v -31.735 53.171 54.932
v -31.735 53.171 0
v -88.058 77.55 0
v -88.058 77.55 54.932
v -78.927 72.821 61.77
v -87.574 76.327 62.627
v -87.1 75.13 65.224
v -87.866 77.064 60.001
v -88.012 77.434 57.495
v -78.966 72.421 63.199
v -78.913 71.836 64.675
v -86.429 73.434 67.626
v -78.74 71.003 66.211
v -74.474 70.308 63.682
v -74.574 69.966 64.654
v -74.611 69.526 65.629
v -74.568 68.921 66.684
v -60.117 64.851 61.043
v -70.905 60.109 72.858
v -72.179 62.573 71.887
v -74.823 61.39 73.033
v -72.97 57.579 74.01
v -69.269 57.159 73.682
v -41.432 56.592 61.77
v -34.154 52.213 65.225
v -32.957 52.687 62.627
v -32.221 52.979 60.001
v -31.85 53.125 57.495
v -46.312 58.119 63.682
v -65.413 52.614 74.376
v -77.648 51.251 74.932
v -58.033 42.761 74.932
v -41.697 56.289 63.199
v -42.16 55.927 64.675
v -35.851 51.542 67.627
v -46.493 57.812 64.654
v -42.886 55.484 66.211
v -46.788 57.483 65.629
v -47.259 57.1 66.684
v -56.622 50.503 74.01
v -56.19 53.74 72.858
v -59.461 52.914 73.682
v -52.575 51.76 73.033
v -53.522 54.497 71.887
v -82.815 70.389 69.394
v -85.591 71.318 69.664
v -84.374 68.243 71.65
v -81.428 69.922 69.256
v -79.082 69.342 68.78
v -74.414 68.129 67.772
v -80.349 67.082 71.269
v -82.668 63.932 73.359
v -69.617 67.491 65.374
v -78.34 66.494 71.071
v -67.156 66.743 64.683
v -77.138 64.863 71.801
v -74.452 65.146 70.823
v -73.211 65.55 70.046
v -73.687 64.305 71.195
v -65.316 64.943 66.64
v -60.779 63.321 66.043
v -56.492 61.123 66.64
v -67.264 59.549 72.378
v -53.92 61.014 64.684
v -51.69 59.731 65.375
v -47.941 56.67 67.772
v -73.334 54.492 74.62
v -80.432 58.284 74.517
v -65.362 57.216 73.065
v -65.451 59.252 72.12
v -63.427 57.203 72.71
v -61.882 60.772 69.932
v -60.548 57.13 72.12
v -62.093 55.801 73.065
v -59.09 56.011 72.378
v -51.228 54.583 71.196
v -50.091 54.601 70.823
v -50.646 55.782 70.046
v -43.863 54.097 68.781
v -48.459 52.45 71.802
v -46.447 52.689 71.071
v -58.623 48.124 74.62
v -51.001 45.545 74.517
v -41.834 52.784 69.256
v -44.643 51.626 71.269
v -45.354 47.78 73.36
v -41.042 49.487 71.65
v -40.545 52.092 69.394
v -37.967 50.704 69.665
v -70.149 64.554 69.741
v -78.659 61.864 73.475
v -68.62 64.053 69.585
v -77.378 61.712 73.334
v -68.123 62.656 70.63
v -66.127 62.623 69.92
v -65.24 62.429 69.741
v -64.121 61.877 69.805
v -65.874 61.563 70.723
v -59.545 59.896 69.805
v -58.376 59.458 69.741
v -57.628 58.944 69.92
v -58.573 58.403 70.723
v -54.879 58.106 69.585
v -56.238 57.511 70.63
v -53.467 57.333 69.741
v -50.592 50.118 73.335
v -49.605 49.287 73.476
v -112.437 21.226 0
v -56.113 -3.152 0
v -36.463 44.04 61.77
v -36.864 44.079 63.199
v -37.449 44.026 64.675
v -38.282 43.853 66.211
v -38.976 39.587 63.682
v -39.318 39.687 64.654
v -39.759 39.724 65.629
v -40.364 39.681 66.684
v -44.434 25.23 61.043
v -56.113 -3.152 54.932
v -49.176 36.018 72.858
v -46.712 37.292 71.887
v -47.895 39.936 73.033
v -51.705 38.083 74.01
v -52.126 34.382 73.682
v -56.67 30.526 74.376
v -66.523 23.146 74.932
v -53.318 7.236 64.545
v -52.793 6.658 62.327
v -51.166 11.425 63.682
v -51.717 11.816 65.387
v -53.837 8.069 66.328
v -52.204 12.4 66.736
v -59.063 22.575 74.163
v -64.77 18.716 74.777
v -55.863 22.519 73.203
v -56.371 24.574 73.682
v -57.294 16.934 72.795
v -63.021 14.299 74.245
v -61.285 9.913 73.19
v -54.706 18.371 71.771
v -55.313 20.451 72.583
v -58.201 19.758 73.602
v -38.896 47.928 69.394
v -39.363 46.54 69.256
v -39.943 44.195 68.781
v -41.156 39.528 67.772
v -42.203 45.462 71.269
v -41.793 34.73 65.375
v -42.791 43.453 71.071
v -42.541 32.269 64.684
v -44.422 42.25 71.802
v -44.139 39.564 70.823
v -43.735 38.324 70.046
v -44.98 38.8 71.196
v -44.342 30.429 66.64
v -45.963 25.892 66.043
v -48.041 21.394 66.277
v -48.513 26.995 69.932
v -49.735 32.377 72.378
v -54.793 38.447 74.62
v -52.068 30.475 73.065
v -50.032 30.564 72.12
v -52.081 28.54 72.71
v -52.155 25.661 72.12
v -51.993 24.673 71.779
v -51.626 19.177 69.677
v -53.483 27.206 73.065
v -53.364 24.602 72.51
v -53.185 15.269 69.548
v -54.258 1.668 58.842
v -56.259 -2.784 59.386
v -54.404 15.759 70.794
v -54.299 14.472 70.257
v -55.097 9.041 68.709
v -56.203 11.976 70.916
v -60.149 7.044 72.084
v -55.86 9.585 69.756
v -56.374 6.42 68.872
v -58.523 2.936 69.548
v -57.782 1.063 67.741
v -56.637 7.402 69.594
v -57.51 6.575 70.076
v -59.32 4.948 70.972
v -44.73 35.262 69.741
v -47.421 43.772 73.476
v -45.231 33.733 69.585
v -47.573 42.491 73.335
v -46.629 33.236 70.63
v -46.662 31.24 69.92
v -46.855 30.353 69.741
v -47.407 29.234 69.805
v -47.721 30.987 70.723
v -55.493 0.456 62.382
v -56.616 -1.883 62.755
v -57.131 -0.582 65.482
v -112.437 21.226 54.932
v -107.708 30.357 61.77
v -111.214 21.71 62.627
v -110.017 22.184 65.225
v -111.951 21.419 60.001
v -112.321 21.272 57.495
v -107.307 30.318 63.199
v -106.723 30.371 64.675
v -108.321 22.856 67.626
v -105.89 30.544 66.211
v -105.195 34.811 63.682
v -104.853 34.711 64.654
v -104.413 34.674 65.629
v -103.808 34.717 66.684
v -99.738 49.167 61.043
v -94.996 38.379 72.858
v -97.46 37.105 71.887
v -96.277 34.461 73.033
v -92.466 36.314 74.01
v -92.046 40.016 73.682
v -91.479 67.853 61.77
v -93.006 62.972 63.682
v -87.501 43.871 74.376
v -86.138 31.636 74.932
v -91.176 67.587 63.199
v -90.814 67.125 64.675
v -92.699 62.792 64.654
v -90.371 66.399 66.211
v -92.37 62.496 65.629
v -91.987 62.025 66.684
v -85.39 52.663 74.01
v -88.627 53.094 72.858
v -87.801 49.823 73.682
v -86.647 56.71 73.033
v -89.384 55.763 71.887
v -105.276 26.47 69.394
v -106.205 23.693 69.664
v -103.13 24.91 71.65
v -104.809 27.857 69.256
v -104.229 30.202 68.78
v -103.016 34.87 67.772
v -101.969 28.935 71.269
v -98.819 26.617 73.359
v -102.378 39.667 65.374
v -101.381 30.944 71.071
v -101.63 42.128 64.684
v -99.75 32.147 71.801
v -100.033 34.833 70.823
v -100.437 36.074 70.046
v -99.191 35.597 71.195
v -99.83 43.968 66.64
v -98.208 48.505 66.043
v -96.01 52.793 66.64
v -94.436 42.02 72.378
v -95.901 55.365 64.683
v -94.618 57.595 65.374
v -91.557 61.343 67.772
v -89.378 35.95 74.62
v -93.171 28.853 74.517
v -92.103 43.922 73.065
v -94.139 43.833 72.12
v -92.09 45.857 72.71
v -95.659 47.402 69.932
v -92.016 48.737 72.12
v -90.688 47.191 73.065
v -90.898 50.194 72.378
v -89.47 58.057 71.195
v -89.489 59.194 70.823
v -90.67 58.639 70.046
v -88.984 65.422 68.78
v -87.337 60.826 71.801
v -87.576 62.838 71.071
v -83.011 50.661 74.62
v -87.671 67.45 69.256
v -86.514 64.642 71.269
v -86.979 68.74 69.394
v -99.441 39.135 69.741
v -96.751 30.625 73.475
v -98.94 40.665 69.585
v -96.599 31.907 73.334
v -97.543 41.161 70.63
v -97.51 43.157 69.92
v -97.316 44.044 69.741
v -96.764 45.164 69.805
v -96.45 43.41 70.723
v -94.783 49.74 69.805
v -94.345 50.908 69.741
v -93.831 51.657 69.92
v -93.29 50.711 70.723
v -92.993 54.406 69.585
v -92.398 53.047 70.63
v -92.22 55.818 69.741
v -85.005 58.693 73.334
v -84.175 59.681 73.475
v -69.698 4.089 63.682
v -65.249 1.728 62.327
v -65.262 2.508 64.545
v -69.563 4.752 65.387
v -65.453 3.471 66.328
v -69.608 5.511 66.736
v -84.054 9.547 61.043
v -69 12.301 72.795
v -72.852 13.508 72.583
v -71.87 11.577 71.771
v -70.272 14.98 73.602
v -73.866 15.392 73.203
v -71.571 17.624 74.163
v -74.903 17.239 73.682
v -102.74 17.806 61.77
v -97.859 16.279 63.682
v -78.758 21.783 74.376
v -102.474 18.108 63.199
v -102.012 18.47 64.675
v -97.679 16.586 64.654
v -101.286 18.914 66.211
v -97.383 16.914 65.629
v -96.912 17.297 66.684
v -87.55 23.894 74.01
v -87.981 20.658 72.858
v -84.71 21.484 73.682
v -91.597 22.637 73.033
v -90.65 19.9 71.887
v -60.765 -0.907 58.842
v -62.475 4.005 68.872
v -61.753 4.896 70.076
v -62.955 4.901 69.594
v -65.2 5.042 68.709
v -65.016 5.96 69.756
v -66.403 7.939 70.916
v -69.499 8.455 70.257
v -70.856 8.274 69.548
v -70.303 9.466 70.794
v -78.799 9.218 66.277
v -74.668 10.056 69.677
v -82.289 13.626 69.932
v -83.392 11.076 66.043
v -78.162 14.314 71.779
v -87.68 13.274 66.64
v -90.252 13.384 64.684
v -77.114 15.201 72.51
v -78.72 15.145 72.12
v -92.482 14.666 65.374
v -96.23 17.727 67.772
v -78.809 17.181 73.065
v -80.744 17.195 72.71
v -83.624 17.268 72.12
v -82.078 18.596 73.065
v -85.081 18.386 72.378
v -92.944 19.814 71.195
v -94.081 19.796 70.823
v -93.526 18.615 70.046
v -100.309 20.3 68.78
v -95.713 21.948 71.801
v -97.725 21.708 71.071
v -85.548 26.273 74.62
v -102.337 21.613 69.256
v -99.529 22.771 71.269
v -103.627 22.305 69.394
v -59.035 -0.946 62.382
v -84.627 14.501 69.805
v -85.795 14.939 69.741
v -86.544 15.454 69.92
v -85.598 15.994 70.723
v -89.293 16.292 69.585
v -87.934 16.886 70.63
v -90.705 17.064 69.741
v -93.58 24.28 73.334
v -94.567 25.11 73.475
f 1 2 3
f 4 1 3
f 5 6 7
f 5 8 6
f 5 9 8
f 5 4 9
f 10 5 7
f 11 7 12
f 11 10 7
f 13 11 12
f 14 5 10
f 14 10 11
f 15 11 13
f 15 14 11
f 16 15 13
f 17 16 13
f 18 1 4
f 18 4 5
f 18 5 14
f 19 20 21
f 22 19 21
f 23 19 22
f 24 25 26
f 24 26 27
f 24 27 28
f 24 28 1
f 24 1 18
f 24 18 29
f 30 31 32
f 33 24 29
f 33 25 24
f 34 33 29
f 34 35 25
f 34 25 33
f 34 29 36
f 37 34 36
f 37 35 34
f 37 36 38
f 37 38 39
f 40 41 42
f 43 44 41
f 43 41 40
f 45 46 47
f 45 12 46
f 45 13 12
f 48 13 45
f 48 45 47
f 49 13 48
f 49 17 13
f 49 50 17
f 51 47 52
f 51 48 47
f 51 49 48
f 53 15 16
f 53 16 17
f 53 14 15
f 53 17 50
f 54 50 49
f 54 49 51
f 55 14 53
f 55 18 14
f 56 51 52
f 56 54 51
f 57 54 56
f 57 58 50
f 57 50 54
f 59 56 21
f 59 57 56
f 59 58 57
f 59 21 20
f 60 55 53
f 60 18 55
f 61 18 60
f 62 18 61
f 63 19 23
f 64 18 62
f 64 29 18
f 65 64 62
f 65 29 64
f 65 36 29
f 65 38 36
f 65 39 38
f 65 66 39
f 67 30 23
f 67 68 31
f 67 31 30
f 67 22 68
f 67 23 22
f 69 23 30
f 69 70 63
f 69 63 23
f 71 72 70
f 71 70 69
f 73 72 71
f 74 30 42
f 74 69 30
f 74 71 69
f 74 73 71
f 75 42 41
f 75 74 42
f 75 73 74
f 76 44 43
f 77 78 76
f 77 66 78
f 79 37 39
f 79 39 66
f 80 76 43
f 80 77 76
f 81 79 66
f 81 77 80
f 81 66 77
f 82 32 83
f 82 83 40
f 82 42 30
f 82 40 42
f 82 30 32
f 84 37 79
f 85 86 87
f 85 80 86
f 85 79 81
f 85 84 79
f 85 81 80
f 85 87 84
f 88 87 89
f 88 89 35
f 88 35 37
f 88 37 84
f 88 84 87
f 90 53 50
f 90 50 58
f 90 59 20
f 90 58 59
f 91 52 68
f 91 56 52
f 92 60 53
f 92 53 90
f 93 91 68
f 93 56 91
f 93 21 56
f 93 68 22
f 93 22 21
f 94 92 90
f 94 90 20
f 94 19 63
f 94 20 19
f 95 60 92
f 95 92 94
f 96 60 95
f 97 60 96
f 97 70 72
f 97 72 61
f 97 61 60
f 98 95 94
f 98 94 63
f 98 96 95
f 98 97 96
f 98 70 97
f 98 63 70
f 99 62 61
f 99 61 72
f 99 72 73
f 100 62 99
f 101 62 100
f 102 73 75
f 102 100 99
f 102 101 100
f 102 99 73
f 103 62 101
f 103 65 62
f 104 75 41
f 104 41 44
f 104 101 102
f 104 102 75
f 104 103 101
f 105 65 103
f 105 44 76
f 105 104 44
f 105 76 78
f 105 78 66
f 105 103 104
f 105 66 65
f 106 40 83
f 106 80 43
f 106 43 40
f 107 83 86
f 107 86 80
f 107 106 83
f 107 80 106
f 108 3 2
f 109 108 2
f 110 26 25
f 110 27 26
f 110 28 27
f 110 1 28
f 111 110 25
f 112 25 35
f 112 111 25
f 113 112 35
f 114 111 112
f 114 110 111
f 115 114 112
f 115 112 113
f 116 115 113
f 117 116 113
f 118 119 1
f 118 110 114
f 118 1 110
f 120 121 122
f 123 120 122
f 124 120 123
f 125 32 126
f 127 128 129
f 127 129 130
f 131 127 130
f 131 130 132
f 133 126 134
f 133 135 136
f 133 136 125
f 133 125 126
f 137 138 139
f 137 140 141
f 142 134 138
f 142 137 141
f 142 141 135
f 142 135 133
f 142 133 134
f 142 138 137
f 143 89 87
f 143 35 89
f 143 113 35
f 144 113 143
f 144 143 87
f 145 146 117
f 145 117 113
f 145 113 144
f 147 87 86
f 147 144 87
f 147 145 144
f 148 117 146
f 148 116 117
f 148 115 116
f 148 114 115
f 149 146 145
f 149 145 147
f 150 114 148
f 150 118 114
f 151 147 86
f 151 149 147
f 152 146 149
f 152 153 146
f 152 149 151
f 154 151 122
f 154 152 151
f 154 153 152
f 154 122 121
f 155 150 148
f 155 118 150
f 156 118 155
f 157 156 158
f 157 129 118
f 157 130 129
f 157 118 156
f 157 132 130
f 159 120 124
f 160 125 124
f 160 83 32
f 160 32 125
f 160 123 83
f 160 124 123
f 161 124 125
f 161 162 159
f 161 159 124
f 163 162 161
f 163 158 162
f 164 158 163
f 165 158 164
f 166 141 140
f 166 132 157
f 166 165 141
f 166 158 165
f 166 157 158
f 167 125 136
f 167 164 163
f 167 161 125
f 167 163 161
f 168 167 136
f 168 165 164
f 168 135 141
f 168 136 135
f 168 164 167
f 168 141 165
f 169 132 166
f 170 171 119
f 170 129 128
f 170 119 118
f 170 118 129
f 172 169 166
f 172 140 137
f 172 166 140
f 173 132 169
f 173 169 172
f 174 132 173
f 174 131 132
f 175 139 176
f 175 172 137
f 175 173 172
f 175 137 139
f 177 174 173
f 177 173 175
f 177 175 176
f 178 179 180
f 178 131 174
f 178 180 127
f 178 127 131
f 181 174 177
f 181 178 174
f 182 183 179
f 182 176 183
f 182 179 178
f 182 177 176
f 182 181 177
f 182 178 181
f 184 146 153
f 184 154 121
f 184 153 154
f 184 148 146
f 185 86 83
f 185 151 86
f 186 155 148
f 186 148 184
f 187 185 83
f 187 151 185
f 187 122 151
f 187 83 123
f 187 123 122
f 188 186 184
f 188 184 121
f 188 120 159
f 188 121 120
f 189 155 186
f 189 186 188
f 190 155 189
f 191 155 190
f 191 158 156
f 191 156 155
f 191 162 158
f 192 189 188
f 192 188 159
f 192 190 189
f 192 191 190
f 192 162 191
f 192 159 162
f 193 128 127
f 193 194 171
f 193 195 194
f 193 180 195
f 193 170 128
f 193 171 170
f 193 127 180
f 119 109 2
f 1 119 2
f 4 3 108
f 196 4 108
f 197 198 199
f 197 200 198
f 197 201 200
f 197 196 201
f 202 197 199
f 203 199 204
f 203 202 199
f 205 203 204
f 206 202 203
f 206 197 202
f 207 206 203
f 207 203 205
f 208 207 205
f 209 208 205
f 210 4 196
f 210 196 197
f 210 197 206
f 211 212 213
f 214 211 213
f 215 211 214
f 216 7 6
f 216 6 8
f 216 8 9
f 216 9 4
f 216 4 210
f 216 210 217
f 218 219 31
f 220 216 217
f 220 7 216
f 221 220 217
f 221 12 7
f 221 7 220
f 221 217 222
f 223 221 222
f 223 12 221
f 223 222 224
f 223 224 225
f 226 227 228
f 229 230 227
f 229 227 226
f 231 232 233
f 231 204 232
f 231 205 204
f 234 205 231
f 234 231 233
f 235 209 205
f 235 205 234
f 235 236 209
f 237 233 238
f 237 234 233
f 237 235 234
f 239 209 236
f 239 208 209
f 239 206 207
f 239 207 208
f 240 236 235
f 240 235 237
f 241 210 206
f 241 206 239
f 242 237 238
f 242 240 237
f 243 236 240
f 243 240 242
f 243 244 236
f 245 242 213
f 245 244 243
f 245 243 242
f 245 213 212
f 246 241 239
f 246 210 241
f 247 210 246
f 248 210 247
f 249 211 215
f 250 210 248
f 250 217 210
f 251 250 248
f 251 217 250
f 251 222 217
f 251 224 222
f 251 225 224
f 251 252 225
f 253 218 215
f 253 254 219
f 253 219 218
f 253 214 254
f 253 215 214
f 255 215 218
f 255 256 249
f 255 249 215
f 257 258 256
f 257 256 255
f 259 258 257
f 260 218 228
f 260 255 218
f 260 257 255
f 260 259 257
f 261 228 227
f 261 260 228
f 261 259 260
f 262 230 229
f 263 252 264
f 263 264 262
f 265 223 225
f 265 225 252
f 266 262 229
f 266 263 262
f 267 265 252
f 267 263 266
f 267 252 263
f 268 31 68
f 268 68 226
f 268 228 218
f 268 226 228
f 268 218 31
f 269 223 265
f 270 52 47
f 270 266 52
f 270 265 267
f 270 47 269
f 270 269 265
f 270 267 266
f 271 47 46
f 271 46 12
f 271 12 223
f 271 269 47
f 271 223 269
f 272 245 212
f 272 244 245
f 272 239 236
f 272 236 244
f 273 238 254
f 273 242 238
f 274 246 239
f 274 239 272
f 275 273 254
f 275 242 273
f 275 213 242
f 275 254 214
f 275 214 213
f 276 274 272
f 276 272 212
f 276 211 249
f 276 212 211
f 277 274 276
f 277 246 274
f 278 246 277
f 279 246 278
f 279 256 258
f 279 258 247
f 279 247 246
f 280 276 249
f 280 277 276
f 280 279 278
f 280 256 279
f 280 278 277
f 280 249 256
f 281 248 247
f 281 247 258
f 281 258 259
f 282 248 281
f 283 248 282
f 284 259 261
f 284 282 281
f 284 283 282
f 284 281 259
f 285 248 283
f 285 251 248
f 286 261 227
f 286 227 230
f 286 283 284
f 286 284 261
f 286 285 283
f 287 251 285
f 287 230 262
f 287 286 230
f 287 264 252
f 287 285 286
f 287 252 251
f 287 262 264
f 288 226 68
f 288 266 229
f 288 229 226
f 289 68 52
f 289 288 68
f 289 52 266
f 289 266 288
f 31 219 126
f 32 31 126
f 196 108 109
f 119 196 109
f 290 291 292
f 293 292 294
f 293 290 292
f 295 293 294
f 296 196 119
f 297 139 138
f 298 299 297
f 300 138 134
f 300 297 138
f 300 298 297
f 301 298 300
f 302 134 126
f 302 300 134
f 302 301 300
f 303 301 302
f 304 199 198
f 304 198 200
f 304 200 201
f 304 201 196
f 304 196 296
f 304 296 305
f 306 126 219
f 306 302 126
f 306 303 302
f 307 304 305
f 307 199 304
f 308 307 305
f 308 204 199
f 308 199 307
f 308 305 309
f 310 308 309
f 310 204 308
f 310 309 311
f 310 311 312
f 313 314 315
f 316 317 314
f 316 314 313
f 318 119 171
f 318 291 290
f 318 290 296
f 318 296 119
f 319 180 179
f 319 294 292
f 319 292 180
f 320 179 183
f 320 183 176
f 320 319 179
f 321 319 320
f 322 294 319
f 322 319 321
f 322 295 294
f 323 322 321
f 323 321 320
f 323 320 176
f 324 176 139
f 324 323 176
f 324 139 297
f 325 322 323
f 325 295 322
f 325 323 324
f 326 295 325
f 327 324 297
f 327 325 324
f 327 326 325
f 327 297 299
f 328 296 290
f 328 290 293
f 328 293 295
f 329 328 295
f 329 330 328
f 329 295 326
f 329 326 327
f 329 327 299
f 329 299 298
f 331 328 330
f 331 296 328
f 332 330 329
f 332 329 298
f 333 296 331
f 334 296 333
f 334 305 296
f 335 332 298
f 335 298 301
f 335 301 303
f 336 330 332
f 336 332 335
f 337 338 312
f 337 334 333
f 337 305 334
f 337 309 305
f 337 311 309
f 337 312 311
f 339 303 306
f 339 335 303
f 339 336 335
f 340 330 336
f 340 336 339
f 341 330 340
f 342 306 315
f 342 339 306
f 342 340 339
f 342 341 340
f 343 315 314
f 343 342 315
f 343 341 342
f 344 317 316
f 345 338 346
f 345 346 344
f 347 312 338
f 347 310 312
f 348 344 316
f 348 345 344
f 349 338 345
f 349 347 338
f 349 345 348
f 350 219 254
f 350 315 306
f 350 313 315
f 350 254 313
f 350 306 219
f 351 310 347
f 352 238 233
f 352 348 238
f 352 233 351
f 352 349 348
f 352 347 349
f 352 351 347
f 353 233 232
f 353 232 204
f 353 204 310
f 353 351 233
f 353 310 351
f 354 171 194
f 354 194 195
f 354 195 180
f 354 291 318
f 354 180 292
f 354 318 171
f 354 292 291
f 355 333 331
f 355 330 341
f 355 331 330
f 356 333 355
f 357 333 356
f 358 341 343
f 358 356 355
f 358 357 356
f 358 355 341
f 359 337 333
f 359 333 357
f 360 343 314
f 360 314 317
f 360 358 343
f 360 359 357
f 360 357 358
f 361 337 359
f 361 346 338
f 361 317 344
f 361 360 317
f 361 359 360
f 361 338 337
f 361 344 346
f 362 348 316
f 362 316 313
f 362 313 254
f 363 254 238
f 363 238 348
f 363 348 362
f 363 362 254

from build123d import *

# Parameters (mm, degrees)
F1_DEPTH    = 74.93201
F2_T1_DEPTH = 161.3731420762
F2_T3_DEPTH = 161.3731420762
F2_T5_DEPTH = 161.3731420762
F2_T7_DEPTH = 161.3731420762


# Not quite as in the source:
# - a fillet or chamfer that OpenCascade refuses, or shapes differently, is made with other operations: its cross-section is extruded or revolved along the edge and cut away or added


with BuildPart() as f1:
    # F0 (on Top) → F1 (new body)
    with BuildSketch(Plane.XY):
        Polygon((-56.1133213341, -3.1524337828), (-31.7345000803, 53.1710572541), (-88.0579911172, 77.5498785079), (-112.436812371, 21.226387471), align=None)
    extrude(amount=F1_DEPTH)

    # F2: fillet of radius 20 on 4 edges, made by hand

    # F2_s2 → F2_t1 (cut)
    with BuildSketch(Plane(origin=(-29.8642383226, -68.9966976654, 0), x_dir=(0, 0, 1), z_dir=(0.3972229615, 0.917722136, 0))):
        with BuildLine():
            add(Edge.make_bspline(
                [(54.93201, -50.2442180275), (74.93201, -50.2442180275), (74.93201, -70.2442180275)],
                knots=[0, 0, 0, 1, 1, 1], degree=2, weights=[1, 1, 1]))
            Line((74.93201, -70.2442180275), (74.93201, -50.2442180275))
            Line((74.93201, -50.2442180275), (54.93201, -50.2442180275))
        make_face()
    extrude(amount=F2_T1_DEPTH, mode=Mode.SUBTRACT)

    # F2_s4 → F2_t3 (cut)
    with BuildSketch(Plane(origin=(-0.2241242898, 0.0970090081, 0), x_dir=(0, 0, 1), z_dir=(-0.917722136, 0.3972229615, 0))):
        with BuildLine():
            add(Edge.make_bspline(
                [(54.93201, 36.1905841301), (74.93201, 36.1905841301), (74.93201, 16.1905841301)],
                knots=[0, 0, 0, 1, 1, 1], degree=2, weights=[1, 1, 1]))
            Line((74.93201, 16.1905841301), (74.93201, 36.1905841301))
            Line((74.93201, 36.1905841301), (54.93201, 36.1905841301))
        make_face()
    extrude(amount=F2_T3_DEPTH, mode=Mode.SUBTRACT)

    # F2_s6 → F2_t5 (cut)
    with BuildSketch(Plane(origin=(34.236879084, 79.0990069677, 0), x_dir=(0, 0, 1), z_dir=(-0.3972229615, -0.917722136, 0))):
        with BuildLine():
            add(Edge.make_bspline(
                [(54.93201, 111.6173601037), (74.93201, 111.6173601037), (74.93201, 91.6173601037)],
                knots=[0, 0, 0, 1, 1, 1], degree=2, weights=[1, 1, 1]))
            Line((74.93201, 91.6173601037), (74.93201, 111.6173601037))
            Line((74.93201, 111.6173601037), (54.93201, 111.6173601037))
        make_face()
    extrude(amount=F2_T5_DEPTH, mode=Mode.SUBTRACT)

    # F2_s8 → F2_t7 (cut)
    with BuildSketch(Plane(origin=(-148.3198289229, 64.1981264147, 0), x_dir=(0, 0, 1), z_dir=(0.917722136, -0.3972229615, 0))):
        with BuildLine():
            add(Edge.make_bspline(
                [(54.93201, 25.1825579461), (74.93201, 25.1825579461), (74.93201, 5.1825579461)],
                knots=[0, 0, 0, 1, 1, 1], degree=2, weights=[1, 1, 1]))
            Line((74.93201, 5.1825579461), (74.93201, 25.1825579461))
            Line((74.93201, 25.1825579461), (54.93201, 25.1825579461))
        make_face()
    extrude(amount=F2_T7_DEPTH, mode=Mode.SUBTRACT)


solid = f1.part
